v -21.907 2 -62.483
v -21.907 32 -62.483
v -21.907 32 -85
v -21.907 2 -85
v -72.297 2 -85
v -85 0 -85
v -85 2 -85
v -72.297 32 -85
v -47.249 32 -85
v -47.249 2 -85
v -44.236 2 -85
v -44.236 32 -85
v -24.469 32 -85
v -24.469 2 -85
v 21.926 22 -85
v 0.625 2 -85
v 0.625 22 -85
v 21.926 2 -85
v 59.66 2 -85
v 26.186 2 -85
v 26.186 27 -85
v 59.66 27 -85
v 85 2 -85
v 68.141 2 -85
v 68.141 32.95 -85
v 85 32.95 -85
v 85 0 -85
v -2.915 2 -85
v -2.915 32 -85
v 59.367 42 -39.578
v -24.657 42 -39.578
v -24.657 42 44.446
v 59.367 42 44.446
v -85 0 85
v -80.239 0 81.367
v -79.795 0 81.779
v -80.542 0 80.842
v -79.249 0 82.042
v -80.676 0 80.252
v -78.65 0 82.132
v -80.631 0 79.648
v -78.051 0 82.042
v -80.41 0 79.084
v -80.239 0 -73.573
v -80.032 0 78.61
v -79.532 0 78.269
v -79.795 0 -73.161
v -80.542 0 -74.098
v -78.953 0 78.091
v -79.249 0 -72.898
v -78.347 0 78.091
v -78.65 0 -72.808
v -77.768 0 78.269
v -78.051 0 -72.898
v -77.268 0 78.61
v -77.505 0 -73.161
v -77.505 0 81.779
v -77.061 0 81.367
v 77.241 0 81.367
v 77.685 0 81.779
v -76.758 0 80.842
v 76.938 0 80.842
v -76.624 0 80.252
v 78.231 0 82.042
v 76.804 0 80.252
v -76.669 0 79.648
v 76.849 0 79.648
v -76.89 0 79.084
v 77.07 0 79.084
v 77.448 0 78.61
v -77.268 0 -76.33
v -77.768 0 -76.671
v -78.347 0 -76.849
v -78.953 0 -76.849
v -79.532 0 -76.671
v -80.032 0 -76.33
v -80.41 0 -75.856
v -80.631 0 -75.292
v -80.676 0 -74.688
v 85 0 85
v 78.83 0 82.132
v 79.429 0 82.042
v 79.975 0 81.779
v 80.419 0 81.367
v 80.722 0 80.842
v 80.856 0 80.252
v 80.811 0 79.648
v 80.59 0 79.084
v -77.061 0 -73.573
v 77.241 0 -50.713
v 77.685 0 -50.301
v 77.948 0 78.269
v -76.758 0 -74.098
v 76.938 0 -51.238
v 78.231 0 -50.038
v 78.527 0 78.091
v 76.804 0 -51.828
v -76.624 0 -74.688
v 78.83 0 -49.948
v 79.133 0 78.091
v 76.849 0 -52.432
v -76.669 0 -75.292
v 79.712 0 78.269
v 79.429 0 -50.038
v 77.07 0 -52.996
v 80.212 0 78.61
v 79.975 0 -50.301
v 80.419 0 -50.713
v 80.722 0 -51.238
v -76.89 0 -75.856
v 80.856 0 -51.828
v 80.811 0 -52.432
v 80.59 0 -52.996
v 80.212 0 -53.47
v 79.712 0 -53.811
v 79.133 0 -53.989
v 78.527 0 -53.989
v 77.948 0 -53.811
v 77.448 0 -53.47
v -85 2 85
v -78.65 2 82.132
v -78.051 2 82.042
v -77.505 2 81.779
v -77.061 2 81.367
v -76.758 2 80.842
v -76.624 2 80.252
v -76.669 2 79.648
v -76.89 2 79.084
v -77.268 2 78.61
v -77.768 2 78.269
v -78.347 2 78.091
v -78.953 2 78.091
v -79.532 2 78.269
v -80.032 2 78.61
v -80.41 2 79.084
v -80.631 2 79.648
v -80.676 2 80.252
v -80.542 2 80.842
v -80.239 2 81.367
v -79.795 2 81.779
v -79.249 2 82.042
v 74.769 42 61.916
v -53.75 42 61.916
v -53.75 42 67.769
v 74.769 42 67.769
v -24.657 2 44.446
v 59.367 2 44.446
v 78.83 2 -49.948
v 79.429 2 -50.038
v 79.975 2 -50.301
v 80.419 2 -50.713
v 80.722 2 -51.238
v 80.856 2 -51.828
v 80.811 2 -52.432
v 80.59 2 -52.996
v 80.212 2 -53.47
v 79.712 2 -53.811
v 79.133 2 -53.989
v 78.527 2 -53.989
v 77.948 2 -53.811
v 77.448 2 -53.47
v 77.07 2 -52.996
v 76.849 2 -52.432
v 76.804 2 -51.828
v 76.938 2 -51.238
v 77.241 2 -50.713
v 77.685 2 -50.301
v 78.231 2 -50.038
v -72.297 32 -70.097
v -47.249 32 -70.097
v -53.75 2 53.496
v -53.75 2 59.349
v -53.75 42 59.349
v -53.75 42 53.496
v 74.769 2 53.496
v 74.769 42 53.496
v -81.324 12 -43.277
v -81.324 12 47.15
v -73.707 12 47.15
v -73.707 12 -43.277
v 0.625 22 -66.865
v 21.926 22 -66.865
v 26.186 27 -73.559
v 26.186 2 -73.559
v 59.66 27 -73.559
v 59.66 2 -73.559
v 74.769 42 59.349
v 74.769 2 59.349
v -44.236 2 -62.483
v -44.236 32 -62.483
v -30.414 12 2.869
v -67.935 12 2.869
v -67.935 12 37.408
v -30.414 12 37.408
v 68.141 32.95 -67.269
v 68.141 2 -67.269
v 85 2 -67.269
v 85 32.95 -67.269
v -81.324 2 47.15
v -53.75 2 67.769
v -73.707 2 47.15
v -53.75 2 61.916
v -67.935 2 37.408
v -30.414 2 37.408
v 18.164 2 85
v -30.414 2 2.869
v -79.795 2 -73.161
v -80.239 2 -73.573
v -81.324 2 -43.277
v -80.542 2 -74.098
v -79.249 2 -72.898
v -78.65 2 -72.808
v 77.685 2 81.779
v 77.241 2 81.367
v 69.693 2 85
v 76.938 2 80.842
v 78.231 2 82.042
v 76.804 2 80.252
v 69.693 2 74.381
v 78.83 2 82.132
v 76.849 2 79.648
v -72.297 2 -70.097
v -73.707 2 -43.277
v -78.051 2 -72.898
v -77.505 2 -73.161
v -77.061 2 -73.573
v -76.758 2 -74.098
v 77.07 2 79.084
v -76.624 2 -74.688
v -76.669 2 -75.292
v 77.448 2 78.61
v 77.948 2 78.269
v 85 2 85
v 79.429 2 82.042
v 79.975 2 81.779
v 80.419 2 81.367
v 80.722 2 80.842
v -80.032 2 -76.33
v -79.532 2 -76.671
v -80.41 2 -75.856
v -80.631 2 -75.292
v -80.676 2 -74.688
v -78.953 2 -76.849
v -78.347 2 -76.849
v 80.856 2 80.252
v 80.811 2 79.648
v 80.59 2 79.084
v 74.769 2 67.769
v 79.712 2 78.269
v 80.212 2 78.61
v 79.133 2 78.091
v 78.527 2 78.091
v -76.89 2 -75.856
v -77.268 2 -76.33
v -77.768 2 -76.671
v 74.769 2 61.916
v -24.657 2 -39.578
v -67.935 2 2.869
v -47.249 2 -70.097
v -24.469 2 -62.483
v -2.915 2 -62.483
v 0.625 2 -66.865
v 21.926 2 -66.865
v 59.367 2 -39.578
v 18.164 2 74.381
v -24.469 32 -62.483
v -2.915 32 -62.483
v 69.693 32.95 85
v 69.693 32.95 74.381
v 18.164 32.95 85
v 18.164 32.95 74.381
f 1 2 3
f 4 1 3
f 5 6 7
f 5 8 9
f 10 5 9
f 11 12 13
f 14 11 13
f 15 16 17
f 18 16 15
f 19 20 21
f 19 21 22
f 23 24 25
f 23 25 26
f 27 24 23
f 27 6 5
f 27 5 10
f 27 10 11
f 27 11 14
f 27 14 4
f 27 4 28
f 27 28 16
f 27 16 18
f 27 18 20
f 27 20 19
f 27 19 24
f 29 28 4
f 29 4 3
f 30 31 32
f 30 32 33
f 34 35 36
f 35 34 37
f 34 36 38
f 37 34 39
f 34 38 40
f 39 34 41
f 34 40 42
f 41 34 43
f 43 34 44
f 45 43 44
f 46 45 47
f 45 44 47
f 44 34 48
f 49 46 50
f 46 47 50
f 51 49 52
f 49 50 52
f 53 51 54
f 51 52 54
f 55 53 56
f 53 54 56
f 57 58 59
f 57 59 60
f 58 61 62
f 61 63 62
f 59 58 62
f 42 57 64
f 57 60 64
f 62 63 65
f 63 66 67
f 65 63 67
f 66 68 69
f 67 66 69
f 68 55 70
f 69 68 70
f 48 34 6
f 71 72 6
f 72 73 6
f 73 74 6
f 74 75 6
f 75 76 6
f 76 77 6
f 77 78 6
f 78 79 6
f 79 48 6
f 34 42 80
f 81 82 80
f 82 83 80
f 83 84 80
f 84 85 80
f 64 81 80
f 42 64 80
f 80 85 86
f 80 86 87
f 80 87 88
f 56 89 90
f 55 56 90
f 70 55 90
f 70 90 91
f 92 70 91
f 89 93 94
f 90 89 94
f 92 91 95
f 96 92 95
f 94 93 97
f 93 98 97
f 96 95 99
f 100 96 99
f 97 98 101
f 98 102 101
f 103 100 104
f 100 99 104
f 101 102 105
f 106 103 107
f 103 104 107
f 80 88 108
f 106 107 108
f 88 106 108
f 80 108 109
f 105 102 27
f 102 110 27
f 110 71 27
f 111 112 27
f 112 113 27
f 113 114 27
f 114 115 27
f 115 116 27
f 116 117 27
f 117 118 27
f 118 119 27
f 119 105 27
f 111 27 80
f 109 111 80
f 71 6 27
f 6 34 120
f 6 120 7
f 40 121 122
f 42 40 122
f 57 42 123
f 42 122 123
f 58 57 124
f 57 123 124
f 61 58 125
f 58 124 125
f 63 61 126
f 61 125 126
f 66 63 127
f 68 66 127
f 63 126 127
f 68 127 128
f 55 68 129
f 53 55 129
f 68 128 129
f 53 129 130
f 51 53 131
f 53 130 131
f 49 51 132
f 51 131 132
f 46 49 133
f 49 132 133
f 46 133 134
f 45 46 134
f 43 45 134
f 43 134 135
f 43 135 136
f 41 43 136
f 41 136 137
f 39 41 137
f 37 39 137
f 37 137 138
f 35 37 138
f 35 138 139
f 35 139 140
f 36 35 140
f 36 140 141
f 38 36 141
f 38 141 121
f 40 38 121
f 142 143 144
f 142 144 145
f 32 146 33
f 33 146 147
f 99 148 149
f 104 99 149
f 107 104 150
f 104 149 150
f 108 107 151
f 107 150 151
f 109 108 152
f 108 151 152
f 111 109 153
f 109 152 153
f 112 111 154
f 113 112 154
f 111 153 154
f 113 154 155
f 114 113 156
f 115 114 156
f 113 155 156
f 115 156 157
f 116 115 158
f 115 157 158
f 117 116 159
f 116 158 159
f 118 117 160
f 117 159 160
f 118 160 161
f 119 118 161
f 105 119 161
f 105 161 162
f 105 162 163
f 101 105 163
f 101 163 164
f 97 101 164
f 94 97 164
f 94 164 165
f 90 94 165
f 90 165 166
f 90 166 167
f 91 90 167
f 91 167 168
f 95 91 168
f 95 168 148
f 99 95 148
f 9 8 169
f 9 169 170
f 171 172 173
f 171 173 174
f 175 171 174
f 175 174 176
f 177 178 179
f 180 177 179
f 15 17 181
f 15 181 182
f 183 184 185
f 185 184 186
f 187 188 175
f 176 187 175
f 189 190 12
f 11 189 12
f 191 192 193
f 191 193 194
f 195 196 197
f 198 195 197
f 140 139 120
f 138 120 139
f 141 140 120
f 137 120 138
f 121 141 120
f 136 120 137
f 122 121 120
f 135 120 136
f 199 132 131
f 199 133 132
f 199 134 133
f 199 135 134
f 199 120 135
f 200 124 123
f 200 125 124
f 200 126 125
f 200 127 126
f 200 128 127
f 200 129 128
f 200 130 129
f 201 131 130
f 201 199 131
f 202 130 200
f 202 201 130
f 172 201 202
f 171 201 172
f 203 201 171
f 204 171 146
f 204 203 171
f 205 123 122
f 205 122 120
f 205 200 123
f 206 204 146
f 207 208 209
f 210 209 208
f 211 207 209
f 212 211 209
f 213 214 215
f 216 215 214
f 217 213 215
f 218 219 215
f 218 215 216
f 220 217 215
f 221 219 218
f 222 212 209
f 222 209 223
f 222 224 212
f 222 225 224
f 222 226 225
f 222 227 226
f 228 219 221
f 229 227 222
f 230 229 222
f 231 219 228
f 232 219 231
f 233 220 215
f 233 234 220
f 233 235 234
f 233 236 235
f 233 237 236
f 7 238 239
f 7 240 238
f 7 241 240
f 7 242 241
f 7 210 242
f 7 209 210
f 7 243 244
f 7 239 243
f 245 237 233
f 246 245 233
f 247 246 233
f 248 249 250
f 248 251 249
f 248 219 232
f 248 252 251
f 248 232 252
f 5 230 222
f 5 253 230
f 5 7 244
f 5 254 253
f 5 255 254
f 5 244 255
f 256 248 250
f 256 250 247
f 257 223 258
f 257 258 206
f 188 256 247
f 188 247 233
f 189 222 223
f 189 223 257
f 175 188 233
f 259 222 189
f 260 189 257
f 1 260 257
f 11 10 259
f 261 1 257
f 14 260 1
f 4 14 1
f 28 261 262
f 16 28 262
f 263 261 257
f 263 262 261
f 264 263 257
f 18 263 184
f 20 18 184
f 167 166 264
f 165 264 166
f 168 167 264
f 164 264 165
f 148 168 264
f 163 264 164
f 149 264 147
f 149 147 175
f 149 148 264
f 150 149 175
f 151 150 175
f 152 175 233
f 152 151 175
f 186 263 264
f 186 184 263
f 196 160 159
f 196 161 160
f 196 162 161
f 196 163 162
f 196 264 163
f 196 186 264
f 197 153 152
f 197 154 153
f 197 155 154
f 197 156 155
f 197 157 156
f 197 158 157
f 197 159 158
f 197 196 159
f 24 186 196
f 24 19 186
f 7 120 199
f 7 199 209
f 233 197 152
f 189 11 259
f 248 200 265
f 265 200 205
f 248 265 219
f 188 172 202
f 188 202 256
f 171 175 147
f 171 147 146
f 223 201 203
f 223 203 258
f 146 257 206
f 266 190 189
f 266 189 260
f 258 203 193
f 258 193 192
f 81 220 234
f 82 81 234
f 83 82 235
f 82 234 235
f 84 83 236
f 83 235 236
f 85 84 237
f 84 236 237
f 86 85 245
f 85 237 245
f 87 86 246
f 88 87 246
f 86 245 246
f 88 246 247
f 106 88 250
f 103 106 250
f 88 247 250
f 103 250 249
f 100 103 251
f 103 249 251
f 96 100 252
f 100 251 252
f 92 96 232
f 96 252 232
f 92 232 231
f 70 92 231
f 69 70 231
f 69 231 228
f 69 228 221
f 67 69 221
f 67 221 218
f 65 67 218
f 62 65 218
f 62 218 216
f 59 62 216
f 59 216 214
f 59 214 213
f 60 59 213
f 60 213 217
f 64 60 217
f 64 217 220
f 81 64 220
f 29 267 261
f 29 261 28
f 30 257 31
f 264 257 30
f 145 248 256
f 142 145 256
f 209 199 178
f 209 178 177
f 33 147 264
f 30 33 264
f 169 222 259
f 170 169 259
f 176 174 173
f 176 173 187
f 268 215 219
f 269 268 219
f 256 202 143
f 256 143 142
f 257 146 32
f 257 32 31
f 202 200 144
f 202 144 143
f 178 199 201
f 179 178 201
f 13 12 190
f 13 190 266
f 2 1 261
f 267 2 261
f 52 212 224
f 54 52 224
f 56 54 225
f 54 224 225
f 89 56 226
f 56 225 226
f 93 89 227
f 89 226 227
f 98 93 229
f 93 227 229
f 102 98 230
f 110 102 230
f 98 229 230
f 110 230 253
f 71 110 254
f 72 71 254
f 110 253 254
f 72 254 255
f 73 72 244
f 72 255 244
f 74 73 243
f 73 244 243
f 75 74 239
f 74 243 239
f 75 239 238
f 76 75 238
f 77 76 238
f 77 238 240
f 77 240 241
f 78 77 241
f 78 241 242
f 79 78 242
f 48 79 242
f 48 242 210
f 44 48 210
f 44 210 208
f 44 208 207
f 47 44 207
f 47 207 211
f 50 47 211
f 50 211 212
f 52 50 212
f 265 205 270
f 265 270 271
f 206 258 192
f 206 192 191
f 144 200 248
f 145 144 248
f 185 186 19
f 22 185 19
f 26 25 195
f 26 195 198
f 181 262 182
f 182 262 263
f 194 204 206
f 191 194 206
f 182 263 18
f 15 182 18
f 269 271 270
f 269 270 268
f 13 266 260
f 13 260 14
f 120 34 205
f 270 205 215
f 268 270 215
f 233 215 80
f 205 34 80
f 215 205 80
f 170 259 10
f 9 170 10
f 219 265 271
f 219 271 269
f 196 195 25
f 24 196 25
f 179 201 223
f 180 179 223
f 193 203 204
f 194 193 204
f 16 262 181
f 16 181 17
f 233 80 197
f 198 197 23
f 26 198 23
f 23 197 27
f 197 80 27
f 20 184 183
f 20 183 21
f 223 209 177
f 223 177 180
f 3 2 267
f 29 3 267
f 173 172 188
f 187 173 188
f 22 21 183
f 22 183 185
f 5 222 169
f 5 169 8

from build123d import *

# Parameters (mm, degrees)
SKETCH1_W           = 170.000000106
SKETCH1_H           = 170.000000106
BOSS_EXTRUDE1_DEPTH = 2
SKETCH2_W           = 128.519017825
SKETCH2_H           = 5.853406533
BOSS_EXTRUDE2_DEPTH = 40
SKETCH3_W           = 84.023612157
SKETCH3_H           = 84.023612156
BOSS_EXTRUDE3_DEPTH = 40
SKETCH4_W           = 25.047517012
SKETCH4_H           = 14.903147005
SKETCH4_W_2         = 19.766346878
SKETCH4_H_2         = 22.517192253
SKETCH4_W_3         = 18.992337586
BOSS_EXTRUDE4_DEPTH = 30
SKETCH5_W           = 21.301196701
SKETCH5_H           = 18.135167802
BOSS_EXTRUDE5_DEPTH = 20
SKETCH6_W           = 33.473309102
SKETCH6_H           = 11.440505981
BOSS_EXTRUDE6_DEPTH = 25
SKETCH7_W           = 16.858518609
SKETCH7_H           = 17.730572085
SKETCH7_W_2         = 51.529446996
SKETCH7_H_2         = 10.618502019
BOSS_EXTRUDE7_DEPTH = 30.95
SKETCH8_W           = 37.52039774
SKETCH8_H           = 34.539531191
SKETCH8_W_2         = 7.616701468
SKETCH8_H_2         = 90.426961443
BOSS_EXTRUDE8_DEPTH = 10
SKETCH9_R           = 2.032
CUT_EXTRUDE1_DEPTH  = 10


with BuildPart() as part:
    # Sketch1 → Boss-Extrude1 (new body)
    with BuildSketch(Plane(origin=(0, 0, 0), x_dir=(1, 0, 0), z_dir=(0, 1, 0))):
        Rectangle(SKETCH1_W, SKETCH1_H)
    extrude(amount=BOSS_EXTRUDE1_DEPTH)

    # Sketch2 → Boss-Extrude2 (add)
    with BuildSketch(Plane(origin=(0, 2, 0), x_dir=(1, 0, 0), z_dir=(0, 1, 0))):
        with Locations((10.509835463, -56.422676592)):
            Rectangle(SKETCH2_W, SKETCH2_H)
        with Locations((10.509835463, -64.84262126)):
            Rectangle(SKETCH2_W, SKETCH2_H)
    extrude(amount=BOSS_EXTRUDE2_DEPTH)

    # Sketch3 → Boss-Extrude3 (add)
    with BuildSketch(Plane(origin=(0, 2, 0), x_dir=(1, 0, 0), z_dir=(0, 1, 0))):
        with Locations((17.355096342, -2.434194161)):
            Rectangle(SKETCH3_W, SKETCH3_H)
    extrude(amount=BOSS_EXTRUDE3_DEPTH)

    # Sketch4 → Boss-Extrude4 (add)
    with BuildSketch(Plane(origin=(0, 2, 0), x_dir=(1, 0, 0), z_dir=(0, 1, 0))):
        with Locations((-59.772791477, 77.548426551)):
            Rectangle(SKETCH4_W, SKETCH4_H)
        with Locations((-34.352625517, 73.741403926)):
            Rectangle(SKETCH4_W_2, SKETCH4_H_2)
        with Locations((-12.41080084, 73.741403926)):
            Rectangle(SKETCH4_W_3, SKETCH4_H_2)
    extrude(amount=BOSS_EXTRUDE4_DEPTH)

    # Sketch5 → Boss-Extrude5 (add)
    with BuildSketch(Plane(origin=(0, 2, 0), x_dir=(1, 0, 0), z_dir=(0, 1, 0))):
        with Locations((11.275402632, 75.932416152)):
            Rectangle(SKETCH5_W, SKETCH5_H)
    extrude(amount=BOSS_EXTRUDE5_DEPTH)

    # Sketch6 → Boss-Extrude6 (add)
    with BuildSketch(Plane(origin=(0, 2, 0), x_dir=(1, 0, 0), z_dir=(0, 1, 0))):
        with Locations((42.922894873, 79.279747063)):
            Rectangle(SKETCH6_W, SKETCH6_H)
    extrude(amount=BOSS_EXTRUDE6_DEPTH)

    # Sketch7 → Boss-Extrude7 (add)
    with BuildSketch(Plane(origin=(0, 2, 0), x_dir=(1, 0, 0), z_dir=(0, 1, 0))):
        with Locations((76.570740749, 76.134714011)):
            Rectangle(SKETCH7_W, SKETCH7_H)
        with Locations((43.928389082, -79.690749044)):
            Rectangle(SKETCH7_W_2, SKETCH7_H_2)
    extrude(amount=BOSS_EXTRUDE7_DEPTH)

    # Sketch8 → Boss-Extrude8 (add)
    with BuildSketch(Plane(origin=(0, 2, 0), x_dir=(1, 0, 0), z_dir=(0, 1, 0))):
        with Locations((-49.174587618, -20.138415223)):
            Rectangle(SKETCH8_W, SKETCH8_H)
        with Locations((-77.515242813, -1.936857576)):
            Rectangle(SKETCH8_W_2, SKETCH8_H_2)
    extrude(amount=BOSS_EXTRUDE8_DEPTH)

    # Sketch9 → Cut-Extrude1 (cut)
    with BuildSketch(Plane(origin=(0, 2, 0), x_dir=(1, 0, 0), z_dir=(0, 1, 0))):
        with Locations(Location((-78.650000053, 74.840000053, 0), (0, 0, 270))):
            Circle(SKETCH9_R)
        with Locations(Location((78.829999947, 51.980000053, 0), (0, 0, 270))):
            Circle(SKETCH9_R)
        with Locations(Location((78.829999947, -80.099999947, 0), (0, 0, 270))):
            Circle(SKETCH9_R)
        with Locations(Location((-78.650000053, -80.099999947, 0), (0, 0, 270))):
            Circle(SKETCH9_R)
    extrude(amount=-CUT_EXTRUDE1_DEPTH, mode=Mode.SUBTRACT)


solid = part.part
